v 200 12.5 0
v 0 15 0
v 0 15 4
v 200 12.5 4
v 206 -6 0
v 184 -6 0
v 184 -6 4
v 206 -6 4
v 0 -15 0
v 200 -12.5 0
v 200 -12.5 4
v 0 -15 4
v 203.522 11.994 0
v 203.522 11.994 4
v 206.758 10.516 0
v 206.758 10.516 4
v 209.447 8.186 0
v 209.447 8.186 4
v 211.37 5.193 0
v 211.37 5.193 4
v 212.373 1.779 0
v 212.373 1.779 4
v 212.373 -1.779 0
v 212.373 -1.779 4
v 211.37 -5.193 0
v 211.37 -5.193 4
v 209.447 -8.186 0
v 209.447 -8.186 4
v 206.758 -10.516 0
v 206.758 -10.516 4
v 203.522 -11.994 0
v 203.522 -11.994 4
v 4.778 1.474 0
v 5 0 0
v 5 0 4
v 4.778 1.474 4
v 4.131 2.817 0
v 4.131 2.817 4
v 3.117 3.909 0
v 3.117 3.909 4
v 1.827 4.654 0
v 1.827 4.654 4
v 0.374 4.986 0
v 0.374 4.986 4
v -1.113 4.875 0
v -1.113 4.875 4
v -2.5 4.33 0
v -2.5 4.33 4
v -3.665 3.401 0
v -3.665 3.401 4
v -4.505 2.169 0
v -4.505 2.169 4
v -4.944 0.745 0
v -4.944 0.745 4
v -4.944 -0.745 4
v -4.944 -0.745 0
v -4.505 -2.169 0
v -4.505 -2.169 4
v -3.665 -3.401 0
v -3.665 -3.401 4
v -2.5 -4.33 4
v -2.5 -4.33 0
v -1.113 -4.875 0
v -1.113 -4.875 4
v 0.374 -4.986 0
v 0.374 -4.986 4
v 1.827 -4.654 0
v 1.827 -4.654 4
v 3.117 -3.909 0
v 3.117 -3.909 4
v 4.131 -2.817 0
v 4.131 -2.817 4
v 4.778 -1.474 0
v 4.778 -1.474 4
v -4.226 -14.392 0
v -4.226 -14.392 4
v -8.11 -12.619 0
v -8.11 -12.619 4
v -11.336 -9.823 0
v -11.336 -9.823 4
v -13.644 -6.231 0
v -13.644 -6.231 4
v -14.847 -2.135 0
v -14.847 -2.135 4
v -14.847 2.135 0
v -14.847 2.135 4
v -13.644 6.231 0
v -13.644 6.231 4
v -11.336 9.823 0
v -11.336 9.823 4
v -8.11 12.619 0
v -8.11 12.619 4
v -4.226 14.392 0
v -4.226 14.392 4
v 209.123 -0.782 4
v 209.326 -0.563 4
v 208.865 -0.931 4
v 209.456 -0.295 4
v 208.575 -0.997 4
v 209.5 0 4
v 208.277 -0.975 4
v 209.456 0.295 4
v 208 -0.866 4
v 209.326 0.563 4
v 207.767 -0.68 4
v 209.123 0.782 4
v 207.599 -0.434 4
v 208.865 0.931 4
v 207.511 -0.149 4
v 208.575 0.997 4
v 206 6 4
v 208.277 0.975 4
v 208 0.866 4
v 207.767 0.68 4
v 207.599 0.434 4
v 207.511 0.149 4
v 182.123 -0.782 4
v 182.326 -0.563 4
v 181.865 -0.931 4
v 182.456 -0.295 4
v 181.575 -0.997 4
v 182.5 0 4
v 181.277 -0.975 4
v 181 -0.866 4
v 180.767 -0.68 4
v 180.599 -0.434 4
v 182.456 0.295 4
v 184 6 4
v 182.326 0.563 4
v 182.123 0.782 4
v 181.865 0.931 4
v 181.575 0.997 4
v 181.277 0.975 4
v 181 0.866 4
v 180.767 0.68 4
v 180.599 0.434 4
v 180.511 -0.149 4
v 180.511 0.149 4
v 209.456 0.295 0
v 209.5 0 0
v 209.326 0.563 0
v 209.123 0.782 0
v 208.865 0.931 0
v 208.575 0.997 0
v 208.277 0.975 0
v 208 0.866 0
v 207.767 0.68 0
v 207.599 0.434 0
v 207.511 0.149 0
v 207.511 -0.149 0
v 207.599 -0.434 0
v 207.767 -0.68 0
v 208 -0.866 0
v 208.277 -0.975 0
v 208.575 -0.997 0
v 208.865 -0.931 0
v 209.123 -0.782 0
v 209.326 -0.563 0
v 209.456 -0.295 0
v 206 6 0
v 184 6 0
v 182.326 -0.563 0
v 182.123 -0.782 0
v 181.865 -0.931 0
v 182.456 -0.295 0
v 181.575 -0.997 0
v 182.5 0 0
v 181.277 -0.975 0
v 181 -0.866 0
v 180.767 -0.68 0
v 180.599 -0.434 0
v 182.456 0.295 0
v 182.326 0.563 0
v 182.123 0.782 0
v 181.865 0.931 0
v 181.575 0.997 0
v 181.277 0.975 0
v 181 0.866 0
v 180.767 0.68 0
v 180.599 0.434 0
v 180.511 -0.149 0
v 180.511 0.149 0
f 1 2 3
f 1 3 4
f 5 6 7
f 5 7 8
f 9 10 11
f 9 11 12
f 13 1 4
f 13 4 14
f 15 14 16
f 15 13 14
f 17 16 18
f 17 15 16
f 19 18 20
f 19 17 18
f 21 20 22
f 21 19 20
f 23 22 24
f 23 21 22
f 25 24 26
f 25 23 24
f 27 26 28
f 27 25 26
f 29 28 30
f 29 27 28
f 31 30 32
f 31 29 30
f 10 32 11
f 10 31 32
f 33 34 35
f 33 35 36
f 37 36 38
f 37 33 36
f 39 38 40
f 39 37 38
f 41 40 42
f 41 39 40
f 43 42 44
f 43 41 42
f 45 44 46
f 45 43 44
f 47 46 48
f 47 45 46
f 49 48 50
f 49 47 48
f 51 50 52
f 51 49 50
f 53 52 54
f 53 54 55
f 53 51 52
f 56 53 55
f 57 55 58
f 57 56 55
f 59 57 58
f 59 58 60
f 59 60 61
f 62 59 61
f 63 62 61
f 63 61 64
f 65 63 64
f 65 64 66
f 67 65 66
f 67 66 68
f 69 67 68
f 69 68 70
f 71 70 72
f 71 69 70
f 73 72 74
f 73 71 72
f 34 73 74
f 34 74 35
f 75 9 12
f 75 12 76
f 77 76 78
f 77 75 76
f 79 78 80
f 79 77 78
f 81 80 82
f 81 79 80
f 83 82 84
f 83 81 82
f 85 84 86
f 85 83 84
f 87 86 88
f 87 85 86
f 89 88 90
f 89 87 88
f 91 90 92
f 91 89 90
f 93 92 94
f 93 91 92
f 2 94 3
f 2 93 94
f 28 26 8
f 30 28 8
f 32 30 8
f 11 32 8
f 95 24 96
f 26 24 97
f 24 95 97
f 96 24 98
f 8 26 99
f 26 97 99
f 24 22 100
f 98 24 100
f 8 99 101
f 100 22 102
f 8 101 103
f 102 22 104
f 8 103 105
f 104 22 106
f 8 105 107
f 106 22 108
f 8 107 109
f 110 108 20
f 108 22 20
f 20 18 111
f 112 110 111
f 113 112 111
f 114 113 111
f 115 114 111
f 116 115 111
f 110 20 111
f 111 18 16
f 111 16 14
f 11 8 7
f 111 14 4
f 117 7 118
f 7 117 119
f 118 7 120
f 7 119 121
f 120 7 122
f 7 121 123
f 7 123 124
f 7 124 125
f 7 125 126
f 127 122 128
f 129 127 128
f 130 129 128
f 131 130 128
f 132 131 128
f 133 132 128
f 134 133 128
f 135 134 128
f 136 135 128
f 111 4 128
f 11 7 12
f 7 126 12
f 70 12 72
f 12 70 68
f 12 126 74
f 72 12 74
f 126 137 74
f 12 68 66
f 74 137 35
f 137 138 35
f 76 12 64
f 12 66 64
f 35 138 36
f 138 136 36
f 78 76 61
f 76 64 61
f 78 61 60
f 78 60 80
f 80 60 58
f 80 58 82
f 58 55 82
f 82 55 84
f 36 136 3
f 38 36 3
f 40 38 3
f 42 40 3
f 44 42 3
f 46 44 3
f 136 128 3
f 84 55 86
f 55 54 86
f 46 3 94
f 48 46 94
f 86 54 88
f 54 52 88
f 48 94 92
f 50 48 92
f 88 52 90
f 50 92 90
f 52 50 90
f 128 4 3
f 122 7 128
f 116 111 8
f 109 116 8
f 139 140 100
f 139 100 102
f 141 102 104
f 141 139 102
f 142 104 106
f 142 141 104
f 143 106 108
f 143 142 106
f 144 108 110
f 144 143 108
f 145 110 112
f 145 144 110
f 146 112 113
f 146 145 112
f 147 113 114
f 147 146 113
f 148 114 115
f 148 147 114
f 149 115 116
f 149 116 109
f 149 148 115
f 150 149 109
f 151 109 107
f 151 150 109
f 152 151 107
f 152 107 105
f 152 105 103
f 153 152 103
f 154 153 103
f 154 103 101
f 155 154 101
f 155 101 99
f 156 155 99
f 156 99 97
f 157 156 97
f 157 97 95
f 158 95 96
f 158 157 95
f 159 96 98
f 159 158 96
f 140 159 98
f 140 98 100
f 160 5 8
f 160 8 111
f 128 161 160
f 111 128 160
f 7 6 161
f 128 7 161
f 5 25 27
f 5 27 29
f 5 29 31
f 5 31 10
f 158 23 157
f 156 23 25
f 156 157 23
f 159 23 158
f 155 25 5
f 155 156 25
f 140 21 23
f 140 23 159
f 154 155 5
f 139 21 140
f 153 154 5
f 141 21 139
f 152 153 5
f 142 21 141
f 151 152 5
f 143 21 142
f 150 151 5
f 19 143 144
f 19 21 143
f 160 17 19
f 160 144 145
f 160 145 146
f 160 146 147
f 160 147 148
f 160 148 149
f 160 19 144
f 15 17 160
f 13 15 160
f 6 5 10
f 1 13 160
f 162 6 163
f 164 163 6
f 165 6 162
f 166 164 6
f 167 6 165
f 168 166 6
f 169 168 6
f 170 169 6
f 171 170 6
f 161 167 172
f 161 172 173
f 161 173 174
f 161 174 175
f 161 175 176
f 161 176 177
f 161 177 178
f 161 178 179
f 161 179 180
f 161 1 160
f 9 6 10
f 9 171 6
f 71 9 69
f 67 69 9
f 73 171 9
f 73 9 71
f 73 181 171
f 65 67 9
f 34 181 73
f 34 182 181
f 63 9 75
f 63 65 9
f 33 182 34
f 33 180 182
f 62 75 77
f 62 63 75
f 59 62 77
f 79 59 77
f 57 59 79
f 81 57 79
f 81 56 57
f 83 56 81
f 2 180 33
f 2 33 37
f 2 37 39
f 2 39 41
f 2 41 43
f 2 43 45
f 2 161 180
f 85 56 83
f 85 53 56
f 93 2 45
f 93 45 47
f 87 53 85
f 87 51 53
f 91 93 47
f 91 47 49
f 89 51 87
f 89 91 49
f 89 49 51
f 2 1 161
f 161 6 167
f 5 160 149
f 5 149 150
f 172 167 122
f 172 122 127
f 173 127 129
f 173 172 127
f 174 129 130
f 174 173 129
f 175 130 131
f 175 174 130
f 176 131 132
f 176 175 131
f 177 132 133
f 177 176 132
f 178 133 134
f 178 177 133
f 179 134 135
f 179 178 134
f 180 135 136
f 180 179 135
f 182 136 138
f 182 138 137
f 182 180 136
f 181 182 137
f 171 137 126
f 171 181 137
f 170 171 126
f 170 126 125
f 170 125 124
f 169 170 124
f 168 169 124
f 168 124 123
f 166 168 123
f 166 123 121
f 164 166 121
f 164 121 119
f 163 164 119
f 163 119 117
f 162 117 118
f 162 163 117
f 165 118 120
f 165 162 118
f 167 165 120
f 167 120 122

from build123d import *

# Parameters (mm, degrees)
SKETCH1_R           = 5
SKETCH1_R_2         = 1
SKETCH1_W           = 22
SKETCH1_H           = 12
BOSS_EXTRUDE1_DEPTH = 4


with BuildPart() as part:
    # Sketch1 → Boss-Extrude1 (new body)
    with BuildSketch(Plane.XY):
        with BuildLine():
            Line((200, 12.5), (0, 15))
            ThreePointArc((0, 15), (-15, 0), (0, -15))
            Line((0, -15), (200, -12.5))
            ThreePointArc((200, -12.5), (212.5, 0), (200, 12.5))
        make_face()
        Circle(SKETCH1_R, mode=Mode.SUBTRACT)
        with Locations((181.5, 0)):
            Circle(SKETCH1_R_2, mode=Mode.SUBTRACT)
        with Locations((195, 0)):
            Rectangle(SKETCH1_W, SKETCH1_H, mode=Mode.SUBTRACT)
        with Locations((208.5, 0)):
            Circle(SKETCH1_R_2, mode=Mode.SUBTRACT)
    extrude(amount=BOSS_EXTRUDE1_DEPTH)


solid = part.part
